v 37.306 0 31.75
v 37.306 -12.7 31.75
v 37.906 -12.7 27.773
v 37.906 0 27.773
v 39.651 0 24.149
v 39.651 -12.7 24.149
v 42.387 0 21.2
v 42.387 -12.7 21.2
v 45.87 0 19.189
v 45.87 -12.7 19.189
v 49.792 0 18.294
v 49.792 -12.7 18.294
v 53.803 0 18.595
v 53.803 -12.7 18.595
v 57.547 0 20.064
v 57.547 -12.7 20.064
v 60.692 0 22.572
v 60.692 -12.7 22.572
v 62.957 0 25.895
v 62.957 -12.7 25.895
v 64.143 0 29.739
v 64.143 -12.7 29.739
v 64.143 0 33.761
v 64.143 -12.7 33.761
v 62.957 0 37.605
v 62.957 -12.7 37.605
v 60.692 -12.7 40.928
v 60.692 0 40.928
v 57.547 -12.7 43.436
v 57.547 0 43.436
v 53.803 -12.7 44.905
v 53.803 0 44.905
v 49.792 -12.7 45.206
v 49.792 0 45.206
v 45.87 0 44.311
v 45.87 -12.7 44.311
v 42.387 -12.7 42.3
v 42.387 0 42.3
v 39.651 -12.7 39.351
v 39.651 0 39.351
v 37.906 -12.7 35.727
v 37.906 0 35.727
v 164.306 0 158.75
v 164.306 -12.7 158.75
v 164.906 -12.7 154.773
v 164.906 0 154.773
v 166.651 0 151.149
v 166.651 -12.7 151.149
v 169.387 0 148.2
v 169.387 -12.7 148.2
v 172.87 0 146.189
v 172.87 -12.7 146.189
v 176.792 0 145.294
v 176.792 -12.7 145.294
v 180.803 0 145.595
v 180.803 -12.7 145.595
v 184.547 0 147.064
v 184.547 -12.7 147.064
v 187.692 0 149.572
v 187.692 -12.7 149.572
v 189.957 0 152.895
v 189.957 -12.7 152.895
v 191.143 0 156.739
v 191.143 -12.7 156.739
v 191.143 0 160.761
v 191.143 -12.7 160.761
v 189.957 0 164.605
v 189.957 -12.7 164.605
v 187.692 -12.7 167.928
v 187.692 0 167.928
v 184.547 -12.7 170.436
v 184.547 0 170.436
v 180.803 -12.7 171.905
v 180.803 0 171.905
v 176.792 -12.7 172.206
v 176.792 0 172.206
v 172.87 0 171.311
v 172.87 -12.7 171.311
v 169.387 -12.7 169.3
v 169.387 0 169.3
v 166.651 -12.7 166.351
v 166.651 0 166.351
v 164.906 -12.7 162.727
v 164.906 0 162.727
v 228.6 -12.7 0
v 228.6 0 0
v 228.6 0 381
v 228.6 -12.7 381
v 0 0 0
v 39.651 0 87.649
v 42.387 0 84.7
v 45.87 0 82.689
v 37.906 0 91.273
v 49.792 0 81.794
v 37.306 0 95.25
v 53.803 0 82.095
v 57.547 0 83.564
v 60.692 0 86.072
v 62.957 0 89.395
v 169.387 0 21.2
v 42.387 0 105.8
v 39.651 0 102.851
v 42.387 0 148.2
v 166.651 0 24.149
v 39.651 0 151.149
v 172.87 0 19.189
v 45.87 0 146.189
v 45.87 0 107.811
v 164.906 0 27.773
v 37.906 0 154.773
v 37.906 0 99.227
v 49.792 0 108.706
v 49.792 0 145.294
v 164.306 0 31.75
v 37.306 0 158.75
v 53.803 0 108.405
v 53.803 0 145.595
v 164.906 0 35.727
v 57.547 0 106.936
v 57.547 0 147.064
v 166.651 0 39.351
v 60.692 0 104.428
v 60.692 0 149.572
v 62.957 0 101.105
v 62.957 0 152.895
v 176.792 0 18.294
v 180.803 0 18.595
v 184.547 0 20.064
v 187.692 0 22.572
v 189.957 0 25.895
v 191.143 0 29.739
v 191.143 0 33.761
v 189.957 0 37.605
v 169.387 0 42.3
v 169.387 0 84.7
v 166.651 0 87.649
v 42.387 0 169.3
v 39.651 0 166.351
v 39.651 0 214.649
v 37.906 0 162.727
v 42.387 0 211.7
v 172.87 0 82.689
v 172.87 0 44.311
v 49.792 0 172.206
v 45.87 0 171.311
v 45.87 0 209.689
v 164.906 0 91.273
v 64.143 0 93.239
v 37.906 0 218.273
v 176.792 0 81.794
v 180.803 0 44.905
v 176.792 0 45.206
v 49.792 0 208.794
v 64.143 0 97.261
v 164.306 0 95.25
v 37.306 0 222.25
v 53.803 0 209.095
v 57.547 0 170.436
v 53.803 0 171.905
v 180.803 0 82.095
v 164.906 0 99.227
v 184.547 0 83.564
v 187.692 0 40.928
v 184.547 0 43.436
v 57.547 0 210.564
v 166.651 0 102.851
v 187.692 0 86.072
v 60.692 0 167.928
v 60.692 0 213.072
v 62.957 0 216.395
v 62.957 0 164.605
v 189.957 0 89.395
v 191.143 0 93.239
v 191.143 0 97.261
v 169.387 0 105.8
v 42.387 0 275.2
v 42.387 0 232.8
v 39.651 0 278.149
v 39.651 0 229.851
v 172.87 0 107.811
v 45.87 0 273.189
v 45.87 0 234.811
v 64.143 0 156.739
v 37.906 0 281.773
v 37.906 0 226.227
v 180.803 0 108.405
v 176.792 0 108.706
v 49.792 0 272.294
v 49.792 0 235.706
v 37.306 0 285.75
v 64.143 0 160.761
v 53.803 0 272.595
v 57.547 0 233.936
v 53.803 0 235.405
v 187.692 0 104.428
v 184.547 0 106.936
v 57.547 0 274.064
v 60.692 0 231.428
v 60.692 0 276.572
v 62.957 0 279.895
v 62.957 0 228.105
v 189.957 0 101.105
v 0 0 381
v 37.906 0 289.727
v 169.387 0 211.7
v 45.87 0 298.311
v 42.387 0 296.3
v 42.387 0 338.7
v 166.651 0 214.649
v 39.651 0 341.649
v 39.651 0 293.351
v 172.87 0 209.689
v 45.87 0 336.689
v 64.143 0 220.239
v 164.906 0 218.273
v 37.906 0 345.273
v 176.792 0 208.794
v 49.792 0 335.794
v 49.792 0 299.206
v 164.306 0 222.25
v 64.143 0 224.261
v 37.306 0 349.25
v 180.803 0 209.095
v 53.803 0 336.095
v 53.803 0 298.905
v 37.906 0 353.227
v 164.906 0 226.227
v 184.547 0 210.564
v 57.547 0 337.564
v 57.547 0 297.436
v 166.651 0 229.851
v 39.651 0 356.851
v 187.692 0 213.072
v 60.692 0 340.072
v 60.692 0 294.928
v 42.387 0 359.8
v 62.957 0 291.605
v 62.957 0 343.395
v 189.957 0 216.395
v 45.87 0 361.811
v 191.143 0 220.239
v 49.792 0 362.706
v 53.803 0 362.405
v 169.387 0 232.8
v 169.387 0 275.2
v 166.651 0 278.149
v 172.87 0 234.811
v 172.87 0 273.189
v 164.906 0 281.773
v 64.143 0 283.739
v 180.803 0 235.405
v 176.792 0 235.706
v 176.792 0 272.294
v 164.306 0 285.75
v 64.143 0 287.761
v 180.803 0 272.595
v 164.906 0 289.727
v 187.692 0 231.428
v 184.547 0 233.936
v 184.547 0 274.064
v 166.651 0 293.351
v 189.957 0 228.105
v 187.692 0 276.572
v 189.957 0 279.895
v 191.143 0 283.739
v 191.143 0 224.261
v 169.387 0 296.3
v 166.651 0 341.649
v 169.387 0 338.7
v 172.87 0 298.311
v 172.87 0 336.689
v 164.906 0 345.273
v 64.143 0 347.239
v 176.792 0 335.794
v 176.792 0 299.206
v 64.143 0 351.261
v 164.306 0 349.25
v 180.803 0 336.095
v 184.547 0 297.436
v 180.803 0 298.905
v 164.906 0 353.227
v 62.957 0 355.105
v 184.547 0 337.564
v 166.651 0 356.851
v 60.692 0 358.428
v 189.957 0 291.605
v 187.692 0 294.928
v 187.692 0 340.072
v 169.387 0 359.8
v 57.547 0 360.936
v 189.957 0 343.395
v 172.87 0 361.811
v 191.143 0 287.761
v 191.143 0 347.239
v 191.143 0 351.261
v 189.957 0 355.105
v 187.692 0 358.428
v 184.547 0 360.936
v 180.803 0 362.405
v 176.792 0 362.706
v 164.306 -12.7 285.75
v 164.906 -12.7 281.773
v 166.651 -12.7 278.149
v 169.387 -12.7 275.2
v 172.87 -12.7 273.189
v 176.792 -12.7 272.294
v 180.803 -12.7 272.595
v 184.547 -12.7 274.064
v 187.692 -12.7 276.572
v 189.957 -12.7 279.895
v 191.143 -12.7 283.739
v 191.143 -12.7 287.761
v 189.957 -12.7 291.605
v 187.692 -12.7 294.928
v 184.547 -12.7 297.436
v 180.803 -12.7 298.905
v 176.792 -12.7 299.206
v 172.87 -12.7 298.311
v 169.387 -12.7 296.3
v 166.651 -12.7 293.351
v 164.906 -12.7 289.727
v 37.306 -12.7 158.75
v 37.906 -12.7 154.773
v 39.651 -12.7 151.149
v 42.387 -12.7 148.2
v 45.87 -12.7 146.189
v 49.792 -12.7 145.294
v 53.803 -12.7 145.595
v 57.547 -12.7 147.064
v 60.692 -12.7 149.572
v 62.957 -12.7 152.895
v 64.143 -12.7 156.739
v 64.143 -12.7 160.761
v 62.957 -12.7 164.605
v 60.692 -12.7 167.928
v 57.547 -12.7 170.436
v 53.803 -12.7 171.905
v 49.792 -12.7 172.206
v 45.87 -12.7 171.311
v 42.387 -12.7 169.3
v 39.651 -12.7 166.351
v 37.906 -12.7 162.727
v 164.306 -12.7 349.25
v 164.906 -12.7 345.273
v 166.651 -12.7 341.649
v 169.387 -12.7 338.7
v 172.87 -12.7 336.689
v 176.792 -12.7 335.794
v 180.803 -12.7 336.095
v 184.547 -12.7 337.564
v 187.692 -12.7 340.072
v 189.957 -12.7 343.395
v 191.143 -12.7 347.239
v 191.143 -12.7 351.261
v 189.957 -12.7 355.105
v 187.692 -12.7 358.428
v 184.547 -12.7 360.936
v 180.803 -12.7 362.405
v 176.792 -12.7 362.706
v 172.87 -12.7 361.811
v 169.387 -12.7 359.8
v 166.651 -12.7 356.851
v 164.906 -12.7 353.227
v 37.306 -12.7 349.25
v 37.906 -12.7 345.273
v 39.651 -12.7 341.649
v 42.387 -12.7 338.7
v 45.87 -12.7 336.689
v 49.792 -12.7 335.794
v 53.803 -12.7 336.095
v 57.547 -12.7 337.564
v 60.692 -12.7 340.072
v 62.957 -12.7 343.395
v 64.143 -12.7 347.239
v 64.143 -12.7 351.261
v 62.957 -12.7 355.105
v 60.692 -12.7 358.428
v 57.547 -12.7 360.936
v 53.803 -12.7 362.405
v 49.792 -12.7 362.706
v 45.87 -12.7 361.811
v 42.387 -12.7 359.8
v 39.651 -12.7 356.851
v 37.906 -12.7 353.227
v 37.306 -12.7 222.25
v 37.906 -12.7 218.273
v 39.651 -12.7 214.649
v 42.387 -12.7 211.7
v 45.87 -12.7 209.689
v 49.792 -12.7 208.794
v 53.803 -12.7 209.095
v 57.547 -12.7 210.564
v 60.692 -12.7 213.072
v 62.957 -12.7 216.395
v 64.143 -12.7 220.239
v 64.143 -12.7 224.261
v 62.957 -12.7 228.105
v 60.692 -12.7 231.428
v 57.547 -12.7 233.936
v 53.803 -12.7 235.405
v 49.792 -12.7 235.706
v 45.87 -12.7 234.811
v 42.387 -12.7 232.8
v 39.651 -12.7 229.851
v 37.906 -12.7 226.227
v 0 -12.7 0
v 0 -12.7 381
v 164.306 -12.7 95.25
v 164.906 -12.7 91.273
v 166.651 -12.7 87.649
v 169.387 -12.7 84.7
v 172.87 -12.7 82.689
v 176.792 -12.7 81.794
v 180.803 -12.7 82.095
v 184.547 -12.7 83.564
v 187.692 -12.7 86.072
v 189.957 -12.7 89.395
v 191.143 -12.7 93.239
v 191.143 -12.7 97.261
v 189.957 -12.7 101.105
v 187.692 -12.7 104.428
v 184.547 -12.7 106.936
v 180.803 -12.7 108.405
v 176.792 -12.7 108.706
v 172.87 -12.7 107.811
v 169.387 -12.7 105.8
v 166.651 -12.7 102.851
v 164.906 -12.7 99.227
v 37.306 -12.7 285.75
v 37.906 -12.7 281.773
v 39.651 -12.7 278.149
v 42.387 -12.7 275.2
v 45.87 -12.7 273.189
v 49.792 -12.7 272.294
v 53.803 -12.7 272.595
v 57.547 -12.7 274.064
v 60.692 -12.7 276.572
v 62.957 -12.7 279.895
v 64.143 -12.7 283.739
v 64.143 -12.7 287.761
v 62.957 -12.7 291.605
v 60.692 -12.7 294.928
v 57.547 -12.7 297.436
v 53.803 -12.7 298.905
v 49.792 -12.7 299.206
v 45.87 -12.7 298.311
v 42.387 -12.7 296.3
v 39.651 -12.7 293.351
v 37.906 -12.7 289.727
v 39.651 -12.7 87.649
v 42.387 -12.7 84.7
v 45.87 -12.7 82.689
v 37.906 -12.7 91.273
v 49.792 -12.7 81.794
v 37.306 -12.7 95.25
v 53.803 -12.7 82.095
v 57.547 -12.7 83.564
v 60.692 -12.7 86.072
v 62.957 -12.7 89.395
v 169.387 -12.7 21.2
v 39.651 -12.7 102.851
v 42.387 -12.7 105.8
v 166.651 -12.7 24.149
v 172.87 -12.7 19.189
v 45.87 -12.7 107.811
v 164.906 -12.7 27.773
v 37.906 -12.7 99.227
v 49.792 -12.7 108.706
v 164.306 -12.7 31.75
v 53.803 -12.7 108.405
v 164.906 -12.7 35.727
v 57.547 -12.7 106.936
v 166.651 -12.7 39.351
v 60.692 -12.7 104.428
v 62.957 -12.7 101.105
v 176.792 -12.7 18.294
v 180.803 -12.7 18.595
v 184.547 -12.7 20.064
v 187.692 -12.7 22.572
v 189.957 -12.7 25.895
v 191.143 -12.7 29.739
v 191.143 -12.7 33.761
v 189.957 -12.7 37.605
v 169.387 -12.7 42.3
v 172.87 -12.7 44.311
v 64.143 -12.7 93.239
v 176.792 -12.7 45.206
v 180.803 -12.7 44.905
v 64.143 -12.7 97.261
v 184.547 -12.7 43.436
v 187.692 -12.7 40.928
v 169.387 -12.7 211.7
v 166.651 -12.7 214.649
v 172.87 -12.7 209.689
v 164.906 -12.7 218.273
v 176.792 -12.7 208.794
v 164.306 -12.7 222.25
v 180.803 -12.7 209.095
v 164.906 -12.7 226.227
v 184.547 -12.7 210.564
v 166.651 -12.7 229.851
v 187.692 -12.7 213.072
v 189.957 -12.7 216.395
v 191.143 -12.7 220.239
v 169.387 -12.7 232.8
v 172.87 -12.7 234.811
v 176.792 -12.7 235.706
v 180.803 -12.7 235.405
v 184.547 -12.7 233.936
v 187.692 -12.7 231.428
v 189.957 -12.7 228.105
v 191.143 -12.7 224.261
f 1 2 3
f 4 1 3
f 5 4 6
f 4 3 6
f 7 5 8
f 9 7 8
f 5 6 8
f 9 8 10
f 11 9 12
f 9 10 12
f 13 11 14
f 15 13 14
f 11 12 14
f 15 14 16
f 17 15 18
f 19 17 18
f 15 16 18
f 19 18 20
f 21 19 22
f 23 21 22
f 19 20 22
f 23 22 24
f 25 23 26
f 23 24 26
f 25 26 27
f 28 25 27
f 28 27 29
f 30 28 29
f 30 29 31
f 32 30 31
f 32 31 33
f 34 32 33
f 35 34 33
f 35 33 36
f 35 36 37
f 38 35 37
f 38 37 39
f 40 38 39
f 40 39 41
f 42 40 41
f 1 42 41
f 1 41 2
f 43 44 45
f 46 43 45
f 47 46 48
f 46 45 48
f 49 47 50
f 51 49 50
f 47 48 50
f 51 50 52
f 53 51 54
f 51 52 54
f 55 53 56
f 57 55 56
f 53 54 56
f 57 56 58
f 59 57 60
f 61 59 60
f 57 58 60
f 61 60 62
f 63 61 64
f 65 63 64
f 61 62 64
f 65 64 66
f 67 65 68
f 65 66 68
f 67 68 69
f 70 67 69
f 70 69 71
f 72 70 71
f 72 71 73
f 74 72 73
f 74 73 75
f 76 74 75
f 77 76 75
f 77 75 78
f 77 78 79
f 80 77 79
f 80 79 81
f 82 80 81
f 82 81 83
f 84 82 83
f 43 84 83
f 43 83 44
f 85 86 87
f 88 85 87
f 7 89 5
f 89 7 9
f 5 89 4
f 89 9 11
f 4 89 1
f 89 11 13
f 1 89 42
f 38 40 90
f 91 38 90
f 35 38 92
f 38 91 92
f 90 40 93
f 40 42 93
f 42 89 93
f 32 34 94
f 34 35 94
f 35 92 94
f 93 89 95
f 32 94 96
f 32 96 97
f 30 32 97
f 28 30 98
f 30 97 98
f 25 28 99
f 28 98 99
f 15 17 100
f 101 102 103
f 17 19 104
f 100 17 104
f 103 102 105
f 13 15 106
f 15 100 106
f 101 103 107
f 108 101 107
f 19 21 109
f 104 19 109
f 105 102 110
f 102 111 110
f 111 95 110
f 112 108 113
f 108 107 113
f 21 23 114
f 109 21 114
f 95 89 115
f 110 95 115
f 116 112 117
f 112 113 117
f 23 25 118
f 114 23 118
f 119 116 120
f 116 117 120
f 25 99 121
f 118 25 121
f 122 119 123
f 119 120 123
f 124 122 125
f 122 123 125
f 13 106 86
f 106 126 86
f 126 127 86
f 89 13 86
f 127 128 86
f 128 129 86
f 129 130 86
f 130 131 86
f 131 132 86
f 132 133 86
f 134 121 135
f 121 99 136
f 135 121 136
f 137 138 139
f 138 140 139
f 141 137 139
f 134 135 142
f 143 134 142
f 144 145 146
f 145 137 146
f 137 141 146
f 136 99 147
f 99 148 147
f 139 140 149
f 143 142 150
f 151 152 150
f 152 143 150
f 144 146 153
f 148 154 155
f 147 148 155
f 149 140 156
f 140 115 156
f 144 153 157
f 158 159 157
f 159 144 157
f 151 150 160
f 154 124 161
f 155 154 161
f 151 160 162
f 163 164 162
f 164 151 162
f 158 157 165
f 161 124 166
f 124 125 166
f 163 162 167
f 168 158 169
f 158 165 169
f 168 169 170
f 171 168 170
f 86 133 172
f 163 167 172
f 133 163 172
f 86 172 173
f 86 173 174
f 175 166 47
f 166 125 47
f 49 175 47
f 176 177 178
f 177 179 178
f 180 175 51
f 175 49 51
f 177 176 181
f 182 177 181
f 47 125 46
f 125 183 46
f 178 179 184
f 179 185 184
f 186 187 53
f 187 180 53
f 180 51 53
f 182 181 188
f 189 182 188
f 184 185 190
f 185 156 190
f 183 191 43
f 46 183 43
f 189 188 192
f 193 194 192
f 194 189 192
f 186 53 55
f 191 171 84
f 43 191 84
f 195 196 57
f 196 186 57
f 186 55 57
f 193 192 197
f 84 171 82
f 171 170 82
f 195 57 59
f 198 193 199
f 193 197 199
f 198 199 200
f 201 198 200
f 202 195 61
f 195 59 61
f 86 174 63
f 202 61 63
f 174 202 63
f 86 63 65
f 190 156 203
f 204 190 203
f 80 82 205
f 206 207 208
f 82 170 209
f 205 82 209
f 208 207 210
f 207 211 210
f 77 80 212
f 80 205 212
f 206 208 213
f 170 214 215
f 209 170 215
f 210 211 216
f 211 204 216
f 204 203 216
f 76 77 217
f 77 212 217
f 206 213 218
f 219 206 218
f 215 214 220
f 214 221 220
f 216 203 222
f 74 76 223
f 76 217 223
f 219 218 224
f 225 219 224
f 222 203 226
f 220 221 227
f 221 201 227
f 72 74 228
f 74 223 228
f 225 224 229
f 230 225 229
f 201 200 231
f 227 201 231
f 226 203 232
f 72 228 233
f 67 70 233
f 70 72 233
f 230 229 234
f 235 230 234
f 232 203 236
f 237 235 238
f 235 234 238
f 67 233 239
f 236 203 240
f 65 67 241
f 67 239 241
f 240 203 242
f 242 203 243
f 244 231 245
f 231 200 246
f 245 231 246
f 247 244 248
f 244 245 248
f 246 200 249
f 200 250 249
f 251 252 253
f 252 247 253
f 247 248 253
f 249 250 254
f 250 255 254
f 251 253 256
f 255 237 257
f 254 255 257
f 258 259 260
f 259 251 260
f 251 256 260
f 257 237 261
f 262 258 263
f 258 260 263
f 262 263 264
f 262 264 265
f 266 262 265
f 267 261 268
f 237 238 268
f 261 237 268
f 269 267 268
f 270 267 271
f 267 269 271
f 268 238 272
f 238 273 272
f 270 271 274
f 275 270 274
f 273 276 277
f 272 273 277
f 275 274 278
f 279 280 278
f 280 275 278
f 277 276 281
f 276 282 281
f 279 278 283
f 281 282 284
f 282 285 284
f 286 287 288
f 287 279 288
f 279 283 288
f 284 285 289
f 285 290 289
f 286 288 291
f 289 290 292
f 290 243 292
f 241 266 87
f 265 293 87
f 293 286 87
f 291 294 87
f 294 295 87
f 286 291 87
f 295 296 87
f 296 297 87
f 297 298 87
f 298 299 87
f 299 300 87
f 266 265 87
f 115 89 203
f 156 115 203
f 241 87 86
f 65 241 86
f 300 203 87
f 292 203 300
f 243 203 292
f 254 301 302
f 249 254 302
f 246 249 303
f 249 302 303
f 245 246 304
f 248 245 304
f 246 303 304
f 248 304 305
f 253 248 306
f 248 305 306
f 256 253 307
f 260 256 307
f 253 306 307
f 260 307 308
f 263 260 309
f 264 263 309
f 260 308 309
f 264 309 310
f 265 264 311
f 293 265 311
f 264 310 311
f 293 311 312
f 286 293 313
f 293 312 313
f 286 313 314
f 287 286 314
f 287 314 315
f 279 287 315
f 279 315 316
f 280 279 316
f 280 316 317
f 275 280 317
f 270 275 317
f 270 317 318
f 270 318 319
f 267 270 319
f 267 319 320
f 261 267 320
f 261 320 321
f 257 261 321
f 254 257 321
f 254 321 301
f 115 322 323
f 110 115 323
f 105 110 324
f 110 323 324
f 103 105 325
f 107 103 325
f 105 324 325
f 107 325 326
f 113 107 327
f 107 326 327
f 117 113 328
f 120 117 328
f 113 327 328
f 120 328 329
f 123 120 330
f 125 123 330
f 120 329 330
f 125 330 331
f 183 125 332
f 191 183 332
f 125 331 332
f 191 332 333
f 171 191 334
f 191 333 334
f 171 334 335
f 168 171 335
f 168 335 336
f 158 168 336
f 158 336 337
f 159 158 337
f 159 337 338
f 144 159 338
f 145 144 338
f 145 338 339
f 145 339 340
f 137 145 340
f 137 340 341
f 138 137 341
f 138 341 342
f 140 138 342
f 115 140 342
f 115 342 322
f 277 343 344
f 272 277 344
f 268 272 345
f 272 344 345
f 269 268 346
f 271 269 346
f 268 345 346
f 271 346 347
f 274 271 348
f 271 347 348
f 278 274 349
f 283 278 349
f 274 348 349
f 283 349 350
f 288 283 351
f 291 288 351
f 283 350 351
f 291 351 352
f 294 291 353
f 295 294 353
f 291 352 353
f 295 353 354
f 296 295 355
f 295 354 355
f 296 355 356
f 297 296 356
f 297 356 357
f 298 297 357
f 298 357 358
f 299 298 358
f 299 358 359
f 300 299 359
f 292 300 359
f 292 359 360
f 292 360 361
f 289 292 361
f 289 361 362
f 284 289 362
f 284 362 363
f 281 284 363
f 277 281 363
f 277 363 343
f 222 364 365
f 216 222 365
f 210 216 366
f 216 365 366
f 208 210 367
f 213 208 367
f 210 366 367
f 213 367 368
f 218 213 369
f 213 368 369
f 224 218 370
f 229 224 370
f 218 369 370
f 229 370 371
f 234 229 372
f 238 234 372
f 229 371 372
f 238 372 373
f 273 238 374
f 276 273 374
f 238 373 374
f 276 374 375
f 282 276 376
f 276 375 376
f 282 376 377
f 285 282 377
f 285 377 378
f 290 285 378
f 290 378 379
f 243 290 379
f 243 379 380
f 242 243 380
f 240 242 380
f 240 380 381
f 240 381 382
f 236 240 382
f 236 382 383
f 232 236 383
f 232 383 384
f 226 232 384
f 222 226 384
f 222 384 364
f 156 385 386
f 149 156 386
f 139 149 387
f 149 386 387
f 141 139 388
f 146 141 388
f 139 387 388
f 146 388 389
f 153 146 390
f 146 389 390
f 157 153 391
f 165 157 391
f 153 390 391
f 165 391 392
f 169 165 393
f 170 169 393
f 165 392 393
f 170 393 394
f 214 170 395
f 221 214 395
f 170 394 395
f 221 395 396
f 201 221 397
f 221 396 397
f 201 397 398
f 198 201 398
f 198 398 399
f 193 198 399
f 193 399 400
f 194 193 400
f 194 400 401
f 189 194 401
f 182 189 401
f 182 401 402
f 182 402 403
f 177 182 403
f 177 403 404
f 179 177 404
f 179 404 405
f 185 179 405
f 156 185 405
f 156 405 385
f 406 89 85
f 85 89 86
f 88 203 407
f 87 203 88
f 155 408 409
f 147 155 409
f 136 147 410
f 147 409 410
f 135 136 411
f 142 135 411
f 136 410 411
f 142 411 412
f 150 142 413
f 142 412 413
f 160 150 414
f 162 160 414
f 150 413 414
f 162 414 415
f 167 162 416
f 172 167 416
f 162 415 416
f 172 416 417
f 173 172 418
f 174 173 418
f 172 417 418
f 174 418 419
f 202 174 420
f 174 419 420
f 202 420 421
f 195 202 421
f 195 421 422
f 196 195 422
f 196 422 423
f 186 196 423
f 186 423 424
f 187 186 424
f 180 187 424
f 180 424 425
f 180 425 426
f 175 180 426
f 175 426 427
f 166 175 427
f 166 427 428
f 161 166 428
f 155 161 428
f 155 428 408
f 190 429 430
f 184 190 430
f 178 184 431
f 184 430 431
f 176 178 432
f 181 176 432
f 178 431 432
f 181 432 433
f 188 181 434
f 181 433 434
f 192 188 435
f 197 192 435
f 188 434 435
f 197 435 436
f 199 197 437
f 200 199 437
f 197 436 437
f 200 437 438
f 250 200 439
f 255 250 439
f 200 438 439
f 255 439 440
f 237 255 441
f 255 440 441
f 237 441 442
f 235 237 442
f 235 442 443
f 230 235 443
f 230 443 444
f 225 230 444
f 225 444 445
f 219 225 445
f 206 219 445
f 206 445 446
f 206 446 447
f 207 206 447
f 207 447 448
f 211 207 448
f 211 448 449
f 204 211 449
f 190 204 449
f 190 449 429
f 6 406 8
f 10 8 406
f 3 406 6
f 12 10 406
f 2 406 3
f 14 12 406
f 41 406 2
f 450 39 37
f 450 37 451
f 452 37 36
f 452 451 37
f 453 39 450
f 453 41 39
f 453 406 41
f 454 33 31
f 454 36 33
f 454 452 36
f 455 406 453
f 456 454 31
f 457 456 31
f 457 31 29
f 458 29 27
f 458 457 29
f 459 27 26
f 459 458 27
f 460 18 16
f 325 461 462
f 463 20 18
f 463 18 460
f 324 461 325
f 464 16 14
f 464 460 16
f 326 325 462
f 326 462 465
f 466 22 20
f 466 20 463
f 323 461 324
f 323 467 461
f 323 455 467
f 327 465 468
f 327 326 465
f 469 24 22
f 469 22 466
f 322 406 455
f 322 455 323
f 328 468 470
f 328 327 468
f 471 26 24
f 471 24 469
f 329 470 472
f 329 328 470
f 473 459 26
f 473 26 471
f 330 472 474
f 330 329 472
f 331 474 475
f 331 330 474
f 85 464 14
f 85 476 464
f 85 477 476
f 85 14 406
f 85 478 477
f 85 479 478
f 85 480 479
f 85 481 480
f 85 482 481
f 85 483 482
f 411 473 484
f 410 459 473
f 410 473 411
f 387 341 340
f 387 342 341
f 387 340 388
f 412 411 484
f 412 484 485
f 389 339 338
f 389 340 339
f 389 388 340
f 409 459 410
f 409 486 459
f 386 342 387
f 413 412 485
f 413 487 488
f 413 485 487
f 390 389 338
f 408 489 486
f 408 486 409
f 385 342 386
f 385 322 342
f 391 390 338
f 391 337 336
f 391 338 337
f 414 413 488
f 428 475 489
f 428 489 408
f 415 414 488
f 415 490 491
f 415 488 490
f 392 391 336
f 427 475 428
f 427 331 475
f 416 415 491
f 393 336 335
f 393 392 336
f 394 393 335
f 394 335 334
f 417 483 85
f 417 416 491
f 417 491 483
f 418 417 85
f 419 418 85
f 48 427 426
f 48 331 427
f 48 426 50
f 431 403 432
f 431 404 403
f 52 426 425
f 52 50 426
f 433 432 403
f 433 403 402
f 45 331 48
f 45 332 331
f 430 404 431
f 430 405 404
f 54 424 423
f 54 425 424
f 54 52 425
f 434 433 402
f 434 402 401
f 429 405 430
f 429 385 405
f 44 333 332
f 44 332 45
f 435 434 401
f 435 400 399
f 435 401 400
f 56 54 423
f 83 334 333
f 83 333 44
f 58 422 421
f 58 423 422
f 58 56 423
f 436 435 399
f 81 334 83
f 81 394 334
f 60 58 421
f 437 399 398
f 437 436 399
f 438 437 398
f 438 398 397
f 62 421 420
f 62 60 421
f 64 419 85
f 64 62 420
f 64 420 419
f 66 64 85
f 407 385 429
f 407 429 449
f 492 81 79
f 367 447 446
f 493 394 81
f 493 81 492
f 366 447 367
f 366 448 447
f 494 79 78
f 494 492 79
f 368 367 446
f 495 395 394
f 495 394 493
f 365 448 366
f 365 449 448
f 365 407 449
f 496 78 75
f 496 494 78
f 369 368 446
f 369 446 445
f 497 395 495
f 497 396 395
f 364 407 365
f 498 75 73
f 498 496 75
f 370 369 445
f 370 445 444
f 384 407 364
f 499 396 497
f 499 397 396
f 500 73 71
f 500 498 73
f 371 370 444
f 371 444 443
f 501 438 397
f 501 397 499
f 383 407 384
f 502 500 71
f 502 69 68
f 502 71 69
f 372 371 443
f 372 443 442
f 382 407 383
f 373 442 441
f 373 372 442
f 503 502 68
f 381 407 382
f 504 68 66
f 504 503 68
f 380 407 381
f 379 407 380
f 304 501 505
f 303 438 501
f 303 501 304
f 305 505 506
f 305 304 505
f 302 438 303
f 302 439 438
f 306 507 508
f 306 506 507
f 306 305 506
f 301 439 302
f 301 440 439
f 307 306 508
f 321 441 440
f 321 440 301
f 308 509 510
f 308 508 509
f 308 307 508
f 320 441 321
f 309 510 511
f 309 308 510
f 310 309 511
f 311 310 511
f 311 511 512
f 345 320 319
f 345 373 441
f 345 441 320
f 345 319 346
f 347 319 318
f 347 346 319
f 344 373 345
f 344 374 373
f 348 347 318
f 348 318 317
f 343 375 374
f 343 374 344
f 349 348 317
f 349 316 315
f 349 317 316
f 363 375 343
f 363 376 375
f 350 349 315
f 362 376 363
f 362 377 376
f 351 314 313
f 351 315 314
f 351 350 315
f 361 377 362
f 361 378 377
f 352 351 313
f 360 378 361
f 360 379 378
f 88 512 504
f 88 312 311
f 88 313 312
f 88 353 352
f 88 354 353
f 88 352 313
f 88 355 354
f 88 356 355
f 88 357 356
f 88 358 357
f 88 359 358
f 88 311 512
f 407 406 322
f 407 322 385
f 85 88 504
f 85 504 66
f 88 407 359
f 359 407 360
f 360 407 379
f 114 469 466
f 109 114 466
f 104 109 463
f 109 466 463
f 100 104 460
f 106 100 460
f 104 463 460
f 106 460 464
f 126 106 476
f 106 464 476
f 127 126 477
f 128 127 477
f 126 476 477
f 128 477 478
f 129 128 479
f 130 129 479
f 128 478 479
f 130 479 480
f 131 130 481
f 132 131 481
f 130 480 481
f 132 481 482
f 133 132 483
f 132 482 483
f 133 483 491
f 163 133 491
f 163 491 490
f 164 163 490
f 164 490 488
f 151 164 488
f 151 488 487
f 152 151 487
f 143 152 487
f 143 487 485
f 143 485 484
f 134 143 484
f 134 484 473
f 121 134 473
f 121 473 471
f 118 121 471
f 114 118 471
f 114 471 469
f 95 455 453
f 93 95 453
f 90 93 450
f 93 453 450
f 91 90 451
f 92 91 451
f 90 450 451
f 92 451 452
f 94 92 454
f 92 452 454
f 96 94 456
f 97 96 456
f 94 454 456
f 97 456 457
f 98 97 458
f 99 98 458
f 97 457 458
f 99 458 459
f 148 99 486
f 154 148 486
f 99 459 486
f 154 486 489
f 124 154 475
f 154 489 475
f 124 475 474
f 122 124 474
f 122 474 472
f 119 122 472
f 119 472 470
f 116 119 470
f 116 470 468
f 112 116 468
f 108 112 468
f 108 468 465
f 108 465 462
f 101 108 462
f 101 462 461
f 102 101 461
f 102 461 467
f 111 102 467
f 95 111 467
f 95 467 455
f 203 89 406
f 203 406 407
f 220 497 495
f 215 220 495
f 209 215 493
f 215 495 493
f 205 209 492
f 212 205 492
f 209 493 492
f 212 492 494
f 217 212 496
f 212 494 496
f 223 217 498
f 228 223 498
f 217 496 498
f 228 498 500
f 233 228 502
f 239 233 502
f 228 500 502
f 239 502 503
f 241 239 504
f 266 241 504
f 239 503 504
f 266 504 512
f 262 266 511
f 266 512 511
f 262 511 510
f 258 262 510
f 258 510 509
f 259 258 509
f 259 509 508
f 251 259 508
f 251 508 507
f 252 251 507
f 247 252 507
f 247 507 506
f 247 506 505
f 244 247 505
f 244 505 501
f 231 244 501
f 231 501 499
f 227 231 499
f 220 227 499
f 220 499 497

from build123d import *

# Parameters (mm, degrees)
F0_W     = 228.6
F0_H     = 381
F1_DEPTH = 12.7
F2_D     = 26.9875
F2_DEPTH = 25.4
F2_TIP   = 8.107862978


with BuildPart() as f1:
    # F0 (on Front) → F1 (new body)
    with BuildSketch(Plane.XZ):
        with Locations((114.3, 190.5)):
            Rectangle(F0_W, F0_H)
    extrude(amount=F1_DEPTH)

    # F2
    with Locations(Plane(origin=(0, 0, 0), x_dir=(1, 0, 0), z_dir=(0, 1, 0))):
        with Locations((177.8, -349.25), (177.8, -285.75), (177.8, -222.25), (177.8, -158.75), (177.8, -95.25), (177.8, -31.75), (50.8, -31.75), (50.8, -95.25), (50.8, -222.25), (50.8, -285.75), (50.8, -349.25), (50.8, -158.75)):
            Hole(F2_D / 2, depth=F2_DEPTH)
            with Locations((0, 0, -(F2_DEPTH + F2_TIP / 2))):  # 118° drill point
                Cone(0, F2_D / 2, F2_TIP, mode=Mode.SUBTRACT)


solid = f1.part
